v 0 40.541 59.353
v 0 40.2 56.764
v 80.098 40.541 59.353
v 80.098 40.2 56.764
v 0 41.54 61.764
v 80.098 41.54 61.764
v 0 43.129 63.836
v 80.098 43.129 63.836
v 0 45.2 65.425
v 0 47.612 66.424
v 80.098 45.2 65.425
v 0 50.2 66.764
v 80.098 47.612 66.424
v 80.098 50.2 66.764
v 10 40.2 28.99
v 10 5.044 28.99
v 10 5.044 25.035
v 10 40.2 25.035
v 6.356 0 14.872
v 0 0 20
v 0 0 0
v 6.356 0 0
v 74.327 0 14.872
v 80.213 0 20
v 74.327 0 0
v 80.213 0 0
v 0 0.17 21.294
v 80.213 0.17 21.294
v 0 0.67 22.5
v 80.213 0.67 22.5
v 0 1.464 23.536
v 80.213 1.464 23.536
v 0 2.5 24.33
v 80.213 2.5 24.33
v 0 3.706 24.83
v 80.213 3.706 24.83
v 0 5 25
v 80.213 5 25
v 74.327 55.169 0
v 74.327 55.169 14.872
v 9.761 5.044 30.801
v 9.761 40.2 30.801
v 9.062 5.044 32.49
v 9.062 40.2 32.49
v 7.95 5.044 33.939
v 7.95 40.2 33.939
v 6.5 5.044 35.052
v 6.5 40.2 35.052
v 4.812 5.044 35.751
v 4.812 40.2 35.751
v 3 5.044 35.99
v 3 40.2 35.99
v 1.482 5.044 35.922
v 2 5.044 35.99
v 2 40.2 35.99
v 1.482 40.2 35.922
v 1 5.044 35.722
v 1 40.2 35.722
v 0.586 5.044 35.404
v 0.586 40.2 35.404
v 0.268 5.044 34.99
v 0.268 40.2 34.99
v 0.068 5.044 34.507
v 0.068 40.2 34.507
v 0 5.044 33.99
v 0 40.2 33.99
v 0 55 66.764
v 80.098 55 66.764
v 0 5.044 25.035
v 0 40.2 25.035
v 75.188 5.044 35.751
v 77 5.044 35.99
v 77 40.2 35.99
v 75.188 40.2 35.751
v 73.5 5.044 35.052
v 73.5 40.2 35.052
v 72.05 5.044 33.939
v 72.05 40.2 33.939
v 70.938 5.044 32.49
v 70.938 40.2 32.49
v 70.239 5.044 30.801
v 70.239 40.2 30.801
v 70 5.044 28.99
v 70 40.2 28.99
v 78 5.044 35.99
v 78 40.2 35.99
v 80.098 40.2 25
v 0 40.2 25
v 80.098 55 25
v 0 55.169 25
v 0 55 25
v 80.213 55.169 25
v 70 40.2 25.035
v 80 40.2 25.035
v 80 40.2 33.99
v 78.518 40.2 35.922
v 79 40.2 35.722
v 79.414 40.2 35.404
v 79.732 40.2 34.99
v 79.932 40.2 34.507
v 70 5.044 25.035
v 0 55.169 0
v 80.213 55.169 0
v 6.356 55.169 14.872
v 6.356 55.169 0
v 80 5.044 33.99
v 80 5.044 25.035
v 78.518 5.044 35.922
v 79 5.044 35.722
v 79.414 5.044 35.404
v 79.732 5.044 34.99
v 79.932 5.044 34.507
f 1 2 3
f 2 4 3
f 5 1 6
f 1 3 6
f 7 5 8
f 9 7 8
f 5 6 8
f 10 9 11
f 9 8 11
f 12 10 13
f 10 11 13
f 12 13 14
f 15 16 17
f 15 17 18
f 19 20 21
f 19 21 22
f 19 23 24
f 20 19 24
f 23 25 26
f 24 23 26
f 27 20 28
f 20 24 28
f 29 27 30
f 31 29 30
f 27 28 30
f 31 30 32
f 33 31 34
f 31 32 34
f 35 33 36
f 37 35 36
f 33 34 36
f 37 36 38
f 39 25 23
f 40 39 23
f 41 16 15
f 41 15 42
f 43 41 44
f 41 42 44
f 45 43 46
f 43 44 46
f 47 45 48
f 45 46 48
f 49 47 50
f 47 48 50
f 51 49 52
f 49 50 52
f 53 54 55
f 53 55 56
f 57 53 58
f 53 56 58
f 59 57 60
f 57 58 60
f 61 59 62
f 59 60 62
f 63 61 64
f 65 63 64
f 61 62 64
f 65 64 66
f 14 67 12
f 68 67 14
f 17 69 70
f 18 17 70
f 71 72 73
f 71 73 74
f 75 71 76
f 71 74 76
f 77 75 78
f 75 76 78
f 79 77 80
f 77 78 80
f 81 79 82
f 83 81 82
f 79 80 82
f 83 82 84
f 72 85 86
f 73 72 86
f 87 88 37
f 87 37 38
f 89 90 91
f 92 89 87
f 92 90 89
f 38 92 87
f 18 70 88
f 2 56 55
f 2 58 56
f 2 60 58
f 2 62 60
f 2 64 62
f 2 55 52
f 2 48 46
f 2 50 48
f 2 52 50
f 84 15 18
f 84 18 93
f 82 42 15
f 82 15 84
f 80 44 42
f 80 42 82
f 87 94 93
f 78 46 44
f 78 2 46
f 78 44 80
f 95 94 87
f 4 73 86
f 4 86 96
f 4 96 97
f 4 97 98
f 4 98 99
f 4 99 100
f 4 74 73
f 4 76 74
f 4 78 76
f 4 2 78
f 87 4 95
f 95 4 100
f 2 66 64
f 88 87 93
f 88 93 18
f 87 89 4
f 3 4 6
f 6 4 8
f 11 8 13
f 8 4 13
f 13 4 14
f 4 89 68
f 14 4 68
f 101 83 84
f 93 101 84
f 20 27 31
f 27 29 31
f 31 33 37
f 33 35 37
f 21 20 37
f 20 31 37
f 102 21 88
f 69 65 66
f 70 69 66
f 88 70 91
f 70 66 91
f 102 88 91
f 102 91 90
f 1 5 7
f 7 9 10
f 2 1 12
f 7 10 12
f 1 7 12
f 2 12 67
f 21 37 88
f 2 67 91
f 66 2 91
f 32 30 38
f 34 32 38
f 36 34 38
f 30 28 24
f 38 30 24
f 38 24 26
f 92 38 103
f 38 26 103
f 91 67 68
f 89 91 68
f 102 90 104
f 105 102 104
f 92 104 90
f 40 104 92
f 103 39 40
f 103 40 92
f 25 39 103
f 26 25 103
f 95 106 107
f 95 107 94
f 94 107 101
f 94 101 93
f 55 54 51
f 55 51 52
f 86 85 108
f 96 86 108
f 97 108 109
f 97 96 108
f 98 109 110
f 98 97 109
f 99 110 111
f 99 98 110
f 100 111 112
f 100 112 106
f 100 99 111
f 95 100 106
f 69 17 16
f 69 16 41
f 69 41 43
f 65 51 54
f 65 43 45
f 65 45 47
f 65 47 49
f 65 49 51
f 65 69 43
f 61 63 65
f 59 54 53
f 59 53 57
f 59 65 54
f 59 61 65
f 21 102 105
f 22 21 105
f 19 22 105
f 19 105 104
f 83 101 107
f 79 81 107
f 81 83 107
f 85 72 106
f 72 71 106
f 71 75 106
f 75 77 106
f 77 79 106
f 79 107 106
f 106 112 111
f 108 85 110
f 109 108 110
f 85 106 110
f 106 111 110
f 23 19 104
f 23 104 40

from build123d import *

# Parameters (mm, degrees)
F0_W      = 80.2132
F0_H      = 55.1688
F1_DEPTH  = 25
F3_W      = 80.0983905792
F3_H      = 66.7644366622
F4_DEPTH  = 14.8
F6_W      = 67.9705310613
F6_H      = 14.8716745898
F7_DEPTH  = 99
F8_R      = 5
F9_W      = 35.595134832
F9_H      = 10.9548680484
F10_DEPTH = 10
F11_R     = 7
F12_R     = 2
F13_R     = 10


# Not quite as in the source:
# - a pattern or mirror of a feature is missing from the dataset's text; its kind, count and spacing are read off the source's solid


with BuildPart() as f1:
    # F0 (on Top) → F1 (new body)
    with BuildSketch(Plane.XY):
        with Locations((40.1066, 27.5844)):
            Rectangle(F0_W, F0_H)
    extrude(amount=F1_DEPTH)

    # F3 (on offset) → F4 (join)
    with BuildSketch(Plane.XZ.offset(-55)):
        with Locations((40.0491952896, 33.3822183311)):
            Rectangle(F3_W, F3_H)
    extrude(amount=F4_DEPTH)

    # F6 (on Front) → F7 (cut)
    with BuildSketch(Plane.XZ):
        with Locations((40.3414806351, 7.4358372949)):
            Rectangle(F6_W, F6_H)
    extrude(amount=-F7_DEPTH, mode=Mode.SUBTRACT)

    # F8
    f8_edges = [f1.edges().sort_by_distance(p)[0] for p in [
        (40.1066, 0, 25),
    ]]
    fillet(f8_edges, radius=F8_R)

    # F9 (on Right) → F10 (join)
    with BuildSketch(Plane.YZ):
        with Locations((22.8417287581, 30.5123161525)):
            Rectangle(F9_W, F9_H)
    f10 = extrude(amount=F10_DEPTH)

    # F10_copies: F10 across plane
    add(f10.mirror(Plane(origin=(40, 0, 0), x_dir=(0, 0, 1), z_dir=(1, 0, 0))))

    # F11
    f11_edges = [f1.edges().sort_by_distance(p)[0] for p in [
        (10, 22.622081, 35.98975),
        (70, 22.622081, 35.98975),
    ]]
    fillet(f11_edges, radius=F11_R)

    # F12
    f12_edges = [f1.edges().sort_by_distance(p)[0] for p in [
        (0, 22.622081, 35.98975),
        (80, 22.622081, 35.98975),
    ]]
    fillet(f12_edges, radius=F12_R)

    # F13
    f13_edges = [f1.edges().sort_by_distance(p)[0] for p in [
        (40.049195, 40.2, 66.764437),
    ]]
    fillet(f13_edges, radius=F13_R)


solid = f1.part
